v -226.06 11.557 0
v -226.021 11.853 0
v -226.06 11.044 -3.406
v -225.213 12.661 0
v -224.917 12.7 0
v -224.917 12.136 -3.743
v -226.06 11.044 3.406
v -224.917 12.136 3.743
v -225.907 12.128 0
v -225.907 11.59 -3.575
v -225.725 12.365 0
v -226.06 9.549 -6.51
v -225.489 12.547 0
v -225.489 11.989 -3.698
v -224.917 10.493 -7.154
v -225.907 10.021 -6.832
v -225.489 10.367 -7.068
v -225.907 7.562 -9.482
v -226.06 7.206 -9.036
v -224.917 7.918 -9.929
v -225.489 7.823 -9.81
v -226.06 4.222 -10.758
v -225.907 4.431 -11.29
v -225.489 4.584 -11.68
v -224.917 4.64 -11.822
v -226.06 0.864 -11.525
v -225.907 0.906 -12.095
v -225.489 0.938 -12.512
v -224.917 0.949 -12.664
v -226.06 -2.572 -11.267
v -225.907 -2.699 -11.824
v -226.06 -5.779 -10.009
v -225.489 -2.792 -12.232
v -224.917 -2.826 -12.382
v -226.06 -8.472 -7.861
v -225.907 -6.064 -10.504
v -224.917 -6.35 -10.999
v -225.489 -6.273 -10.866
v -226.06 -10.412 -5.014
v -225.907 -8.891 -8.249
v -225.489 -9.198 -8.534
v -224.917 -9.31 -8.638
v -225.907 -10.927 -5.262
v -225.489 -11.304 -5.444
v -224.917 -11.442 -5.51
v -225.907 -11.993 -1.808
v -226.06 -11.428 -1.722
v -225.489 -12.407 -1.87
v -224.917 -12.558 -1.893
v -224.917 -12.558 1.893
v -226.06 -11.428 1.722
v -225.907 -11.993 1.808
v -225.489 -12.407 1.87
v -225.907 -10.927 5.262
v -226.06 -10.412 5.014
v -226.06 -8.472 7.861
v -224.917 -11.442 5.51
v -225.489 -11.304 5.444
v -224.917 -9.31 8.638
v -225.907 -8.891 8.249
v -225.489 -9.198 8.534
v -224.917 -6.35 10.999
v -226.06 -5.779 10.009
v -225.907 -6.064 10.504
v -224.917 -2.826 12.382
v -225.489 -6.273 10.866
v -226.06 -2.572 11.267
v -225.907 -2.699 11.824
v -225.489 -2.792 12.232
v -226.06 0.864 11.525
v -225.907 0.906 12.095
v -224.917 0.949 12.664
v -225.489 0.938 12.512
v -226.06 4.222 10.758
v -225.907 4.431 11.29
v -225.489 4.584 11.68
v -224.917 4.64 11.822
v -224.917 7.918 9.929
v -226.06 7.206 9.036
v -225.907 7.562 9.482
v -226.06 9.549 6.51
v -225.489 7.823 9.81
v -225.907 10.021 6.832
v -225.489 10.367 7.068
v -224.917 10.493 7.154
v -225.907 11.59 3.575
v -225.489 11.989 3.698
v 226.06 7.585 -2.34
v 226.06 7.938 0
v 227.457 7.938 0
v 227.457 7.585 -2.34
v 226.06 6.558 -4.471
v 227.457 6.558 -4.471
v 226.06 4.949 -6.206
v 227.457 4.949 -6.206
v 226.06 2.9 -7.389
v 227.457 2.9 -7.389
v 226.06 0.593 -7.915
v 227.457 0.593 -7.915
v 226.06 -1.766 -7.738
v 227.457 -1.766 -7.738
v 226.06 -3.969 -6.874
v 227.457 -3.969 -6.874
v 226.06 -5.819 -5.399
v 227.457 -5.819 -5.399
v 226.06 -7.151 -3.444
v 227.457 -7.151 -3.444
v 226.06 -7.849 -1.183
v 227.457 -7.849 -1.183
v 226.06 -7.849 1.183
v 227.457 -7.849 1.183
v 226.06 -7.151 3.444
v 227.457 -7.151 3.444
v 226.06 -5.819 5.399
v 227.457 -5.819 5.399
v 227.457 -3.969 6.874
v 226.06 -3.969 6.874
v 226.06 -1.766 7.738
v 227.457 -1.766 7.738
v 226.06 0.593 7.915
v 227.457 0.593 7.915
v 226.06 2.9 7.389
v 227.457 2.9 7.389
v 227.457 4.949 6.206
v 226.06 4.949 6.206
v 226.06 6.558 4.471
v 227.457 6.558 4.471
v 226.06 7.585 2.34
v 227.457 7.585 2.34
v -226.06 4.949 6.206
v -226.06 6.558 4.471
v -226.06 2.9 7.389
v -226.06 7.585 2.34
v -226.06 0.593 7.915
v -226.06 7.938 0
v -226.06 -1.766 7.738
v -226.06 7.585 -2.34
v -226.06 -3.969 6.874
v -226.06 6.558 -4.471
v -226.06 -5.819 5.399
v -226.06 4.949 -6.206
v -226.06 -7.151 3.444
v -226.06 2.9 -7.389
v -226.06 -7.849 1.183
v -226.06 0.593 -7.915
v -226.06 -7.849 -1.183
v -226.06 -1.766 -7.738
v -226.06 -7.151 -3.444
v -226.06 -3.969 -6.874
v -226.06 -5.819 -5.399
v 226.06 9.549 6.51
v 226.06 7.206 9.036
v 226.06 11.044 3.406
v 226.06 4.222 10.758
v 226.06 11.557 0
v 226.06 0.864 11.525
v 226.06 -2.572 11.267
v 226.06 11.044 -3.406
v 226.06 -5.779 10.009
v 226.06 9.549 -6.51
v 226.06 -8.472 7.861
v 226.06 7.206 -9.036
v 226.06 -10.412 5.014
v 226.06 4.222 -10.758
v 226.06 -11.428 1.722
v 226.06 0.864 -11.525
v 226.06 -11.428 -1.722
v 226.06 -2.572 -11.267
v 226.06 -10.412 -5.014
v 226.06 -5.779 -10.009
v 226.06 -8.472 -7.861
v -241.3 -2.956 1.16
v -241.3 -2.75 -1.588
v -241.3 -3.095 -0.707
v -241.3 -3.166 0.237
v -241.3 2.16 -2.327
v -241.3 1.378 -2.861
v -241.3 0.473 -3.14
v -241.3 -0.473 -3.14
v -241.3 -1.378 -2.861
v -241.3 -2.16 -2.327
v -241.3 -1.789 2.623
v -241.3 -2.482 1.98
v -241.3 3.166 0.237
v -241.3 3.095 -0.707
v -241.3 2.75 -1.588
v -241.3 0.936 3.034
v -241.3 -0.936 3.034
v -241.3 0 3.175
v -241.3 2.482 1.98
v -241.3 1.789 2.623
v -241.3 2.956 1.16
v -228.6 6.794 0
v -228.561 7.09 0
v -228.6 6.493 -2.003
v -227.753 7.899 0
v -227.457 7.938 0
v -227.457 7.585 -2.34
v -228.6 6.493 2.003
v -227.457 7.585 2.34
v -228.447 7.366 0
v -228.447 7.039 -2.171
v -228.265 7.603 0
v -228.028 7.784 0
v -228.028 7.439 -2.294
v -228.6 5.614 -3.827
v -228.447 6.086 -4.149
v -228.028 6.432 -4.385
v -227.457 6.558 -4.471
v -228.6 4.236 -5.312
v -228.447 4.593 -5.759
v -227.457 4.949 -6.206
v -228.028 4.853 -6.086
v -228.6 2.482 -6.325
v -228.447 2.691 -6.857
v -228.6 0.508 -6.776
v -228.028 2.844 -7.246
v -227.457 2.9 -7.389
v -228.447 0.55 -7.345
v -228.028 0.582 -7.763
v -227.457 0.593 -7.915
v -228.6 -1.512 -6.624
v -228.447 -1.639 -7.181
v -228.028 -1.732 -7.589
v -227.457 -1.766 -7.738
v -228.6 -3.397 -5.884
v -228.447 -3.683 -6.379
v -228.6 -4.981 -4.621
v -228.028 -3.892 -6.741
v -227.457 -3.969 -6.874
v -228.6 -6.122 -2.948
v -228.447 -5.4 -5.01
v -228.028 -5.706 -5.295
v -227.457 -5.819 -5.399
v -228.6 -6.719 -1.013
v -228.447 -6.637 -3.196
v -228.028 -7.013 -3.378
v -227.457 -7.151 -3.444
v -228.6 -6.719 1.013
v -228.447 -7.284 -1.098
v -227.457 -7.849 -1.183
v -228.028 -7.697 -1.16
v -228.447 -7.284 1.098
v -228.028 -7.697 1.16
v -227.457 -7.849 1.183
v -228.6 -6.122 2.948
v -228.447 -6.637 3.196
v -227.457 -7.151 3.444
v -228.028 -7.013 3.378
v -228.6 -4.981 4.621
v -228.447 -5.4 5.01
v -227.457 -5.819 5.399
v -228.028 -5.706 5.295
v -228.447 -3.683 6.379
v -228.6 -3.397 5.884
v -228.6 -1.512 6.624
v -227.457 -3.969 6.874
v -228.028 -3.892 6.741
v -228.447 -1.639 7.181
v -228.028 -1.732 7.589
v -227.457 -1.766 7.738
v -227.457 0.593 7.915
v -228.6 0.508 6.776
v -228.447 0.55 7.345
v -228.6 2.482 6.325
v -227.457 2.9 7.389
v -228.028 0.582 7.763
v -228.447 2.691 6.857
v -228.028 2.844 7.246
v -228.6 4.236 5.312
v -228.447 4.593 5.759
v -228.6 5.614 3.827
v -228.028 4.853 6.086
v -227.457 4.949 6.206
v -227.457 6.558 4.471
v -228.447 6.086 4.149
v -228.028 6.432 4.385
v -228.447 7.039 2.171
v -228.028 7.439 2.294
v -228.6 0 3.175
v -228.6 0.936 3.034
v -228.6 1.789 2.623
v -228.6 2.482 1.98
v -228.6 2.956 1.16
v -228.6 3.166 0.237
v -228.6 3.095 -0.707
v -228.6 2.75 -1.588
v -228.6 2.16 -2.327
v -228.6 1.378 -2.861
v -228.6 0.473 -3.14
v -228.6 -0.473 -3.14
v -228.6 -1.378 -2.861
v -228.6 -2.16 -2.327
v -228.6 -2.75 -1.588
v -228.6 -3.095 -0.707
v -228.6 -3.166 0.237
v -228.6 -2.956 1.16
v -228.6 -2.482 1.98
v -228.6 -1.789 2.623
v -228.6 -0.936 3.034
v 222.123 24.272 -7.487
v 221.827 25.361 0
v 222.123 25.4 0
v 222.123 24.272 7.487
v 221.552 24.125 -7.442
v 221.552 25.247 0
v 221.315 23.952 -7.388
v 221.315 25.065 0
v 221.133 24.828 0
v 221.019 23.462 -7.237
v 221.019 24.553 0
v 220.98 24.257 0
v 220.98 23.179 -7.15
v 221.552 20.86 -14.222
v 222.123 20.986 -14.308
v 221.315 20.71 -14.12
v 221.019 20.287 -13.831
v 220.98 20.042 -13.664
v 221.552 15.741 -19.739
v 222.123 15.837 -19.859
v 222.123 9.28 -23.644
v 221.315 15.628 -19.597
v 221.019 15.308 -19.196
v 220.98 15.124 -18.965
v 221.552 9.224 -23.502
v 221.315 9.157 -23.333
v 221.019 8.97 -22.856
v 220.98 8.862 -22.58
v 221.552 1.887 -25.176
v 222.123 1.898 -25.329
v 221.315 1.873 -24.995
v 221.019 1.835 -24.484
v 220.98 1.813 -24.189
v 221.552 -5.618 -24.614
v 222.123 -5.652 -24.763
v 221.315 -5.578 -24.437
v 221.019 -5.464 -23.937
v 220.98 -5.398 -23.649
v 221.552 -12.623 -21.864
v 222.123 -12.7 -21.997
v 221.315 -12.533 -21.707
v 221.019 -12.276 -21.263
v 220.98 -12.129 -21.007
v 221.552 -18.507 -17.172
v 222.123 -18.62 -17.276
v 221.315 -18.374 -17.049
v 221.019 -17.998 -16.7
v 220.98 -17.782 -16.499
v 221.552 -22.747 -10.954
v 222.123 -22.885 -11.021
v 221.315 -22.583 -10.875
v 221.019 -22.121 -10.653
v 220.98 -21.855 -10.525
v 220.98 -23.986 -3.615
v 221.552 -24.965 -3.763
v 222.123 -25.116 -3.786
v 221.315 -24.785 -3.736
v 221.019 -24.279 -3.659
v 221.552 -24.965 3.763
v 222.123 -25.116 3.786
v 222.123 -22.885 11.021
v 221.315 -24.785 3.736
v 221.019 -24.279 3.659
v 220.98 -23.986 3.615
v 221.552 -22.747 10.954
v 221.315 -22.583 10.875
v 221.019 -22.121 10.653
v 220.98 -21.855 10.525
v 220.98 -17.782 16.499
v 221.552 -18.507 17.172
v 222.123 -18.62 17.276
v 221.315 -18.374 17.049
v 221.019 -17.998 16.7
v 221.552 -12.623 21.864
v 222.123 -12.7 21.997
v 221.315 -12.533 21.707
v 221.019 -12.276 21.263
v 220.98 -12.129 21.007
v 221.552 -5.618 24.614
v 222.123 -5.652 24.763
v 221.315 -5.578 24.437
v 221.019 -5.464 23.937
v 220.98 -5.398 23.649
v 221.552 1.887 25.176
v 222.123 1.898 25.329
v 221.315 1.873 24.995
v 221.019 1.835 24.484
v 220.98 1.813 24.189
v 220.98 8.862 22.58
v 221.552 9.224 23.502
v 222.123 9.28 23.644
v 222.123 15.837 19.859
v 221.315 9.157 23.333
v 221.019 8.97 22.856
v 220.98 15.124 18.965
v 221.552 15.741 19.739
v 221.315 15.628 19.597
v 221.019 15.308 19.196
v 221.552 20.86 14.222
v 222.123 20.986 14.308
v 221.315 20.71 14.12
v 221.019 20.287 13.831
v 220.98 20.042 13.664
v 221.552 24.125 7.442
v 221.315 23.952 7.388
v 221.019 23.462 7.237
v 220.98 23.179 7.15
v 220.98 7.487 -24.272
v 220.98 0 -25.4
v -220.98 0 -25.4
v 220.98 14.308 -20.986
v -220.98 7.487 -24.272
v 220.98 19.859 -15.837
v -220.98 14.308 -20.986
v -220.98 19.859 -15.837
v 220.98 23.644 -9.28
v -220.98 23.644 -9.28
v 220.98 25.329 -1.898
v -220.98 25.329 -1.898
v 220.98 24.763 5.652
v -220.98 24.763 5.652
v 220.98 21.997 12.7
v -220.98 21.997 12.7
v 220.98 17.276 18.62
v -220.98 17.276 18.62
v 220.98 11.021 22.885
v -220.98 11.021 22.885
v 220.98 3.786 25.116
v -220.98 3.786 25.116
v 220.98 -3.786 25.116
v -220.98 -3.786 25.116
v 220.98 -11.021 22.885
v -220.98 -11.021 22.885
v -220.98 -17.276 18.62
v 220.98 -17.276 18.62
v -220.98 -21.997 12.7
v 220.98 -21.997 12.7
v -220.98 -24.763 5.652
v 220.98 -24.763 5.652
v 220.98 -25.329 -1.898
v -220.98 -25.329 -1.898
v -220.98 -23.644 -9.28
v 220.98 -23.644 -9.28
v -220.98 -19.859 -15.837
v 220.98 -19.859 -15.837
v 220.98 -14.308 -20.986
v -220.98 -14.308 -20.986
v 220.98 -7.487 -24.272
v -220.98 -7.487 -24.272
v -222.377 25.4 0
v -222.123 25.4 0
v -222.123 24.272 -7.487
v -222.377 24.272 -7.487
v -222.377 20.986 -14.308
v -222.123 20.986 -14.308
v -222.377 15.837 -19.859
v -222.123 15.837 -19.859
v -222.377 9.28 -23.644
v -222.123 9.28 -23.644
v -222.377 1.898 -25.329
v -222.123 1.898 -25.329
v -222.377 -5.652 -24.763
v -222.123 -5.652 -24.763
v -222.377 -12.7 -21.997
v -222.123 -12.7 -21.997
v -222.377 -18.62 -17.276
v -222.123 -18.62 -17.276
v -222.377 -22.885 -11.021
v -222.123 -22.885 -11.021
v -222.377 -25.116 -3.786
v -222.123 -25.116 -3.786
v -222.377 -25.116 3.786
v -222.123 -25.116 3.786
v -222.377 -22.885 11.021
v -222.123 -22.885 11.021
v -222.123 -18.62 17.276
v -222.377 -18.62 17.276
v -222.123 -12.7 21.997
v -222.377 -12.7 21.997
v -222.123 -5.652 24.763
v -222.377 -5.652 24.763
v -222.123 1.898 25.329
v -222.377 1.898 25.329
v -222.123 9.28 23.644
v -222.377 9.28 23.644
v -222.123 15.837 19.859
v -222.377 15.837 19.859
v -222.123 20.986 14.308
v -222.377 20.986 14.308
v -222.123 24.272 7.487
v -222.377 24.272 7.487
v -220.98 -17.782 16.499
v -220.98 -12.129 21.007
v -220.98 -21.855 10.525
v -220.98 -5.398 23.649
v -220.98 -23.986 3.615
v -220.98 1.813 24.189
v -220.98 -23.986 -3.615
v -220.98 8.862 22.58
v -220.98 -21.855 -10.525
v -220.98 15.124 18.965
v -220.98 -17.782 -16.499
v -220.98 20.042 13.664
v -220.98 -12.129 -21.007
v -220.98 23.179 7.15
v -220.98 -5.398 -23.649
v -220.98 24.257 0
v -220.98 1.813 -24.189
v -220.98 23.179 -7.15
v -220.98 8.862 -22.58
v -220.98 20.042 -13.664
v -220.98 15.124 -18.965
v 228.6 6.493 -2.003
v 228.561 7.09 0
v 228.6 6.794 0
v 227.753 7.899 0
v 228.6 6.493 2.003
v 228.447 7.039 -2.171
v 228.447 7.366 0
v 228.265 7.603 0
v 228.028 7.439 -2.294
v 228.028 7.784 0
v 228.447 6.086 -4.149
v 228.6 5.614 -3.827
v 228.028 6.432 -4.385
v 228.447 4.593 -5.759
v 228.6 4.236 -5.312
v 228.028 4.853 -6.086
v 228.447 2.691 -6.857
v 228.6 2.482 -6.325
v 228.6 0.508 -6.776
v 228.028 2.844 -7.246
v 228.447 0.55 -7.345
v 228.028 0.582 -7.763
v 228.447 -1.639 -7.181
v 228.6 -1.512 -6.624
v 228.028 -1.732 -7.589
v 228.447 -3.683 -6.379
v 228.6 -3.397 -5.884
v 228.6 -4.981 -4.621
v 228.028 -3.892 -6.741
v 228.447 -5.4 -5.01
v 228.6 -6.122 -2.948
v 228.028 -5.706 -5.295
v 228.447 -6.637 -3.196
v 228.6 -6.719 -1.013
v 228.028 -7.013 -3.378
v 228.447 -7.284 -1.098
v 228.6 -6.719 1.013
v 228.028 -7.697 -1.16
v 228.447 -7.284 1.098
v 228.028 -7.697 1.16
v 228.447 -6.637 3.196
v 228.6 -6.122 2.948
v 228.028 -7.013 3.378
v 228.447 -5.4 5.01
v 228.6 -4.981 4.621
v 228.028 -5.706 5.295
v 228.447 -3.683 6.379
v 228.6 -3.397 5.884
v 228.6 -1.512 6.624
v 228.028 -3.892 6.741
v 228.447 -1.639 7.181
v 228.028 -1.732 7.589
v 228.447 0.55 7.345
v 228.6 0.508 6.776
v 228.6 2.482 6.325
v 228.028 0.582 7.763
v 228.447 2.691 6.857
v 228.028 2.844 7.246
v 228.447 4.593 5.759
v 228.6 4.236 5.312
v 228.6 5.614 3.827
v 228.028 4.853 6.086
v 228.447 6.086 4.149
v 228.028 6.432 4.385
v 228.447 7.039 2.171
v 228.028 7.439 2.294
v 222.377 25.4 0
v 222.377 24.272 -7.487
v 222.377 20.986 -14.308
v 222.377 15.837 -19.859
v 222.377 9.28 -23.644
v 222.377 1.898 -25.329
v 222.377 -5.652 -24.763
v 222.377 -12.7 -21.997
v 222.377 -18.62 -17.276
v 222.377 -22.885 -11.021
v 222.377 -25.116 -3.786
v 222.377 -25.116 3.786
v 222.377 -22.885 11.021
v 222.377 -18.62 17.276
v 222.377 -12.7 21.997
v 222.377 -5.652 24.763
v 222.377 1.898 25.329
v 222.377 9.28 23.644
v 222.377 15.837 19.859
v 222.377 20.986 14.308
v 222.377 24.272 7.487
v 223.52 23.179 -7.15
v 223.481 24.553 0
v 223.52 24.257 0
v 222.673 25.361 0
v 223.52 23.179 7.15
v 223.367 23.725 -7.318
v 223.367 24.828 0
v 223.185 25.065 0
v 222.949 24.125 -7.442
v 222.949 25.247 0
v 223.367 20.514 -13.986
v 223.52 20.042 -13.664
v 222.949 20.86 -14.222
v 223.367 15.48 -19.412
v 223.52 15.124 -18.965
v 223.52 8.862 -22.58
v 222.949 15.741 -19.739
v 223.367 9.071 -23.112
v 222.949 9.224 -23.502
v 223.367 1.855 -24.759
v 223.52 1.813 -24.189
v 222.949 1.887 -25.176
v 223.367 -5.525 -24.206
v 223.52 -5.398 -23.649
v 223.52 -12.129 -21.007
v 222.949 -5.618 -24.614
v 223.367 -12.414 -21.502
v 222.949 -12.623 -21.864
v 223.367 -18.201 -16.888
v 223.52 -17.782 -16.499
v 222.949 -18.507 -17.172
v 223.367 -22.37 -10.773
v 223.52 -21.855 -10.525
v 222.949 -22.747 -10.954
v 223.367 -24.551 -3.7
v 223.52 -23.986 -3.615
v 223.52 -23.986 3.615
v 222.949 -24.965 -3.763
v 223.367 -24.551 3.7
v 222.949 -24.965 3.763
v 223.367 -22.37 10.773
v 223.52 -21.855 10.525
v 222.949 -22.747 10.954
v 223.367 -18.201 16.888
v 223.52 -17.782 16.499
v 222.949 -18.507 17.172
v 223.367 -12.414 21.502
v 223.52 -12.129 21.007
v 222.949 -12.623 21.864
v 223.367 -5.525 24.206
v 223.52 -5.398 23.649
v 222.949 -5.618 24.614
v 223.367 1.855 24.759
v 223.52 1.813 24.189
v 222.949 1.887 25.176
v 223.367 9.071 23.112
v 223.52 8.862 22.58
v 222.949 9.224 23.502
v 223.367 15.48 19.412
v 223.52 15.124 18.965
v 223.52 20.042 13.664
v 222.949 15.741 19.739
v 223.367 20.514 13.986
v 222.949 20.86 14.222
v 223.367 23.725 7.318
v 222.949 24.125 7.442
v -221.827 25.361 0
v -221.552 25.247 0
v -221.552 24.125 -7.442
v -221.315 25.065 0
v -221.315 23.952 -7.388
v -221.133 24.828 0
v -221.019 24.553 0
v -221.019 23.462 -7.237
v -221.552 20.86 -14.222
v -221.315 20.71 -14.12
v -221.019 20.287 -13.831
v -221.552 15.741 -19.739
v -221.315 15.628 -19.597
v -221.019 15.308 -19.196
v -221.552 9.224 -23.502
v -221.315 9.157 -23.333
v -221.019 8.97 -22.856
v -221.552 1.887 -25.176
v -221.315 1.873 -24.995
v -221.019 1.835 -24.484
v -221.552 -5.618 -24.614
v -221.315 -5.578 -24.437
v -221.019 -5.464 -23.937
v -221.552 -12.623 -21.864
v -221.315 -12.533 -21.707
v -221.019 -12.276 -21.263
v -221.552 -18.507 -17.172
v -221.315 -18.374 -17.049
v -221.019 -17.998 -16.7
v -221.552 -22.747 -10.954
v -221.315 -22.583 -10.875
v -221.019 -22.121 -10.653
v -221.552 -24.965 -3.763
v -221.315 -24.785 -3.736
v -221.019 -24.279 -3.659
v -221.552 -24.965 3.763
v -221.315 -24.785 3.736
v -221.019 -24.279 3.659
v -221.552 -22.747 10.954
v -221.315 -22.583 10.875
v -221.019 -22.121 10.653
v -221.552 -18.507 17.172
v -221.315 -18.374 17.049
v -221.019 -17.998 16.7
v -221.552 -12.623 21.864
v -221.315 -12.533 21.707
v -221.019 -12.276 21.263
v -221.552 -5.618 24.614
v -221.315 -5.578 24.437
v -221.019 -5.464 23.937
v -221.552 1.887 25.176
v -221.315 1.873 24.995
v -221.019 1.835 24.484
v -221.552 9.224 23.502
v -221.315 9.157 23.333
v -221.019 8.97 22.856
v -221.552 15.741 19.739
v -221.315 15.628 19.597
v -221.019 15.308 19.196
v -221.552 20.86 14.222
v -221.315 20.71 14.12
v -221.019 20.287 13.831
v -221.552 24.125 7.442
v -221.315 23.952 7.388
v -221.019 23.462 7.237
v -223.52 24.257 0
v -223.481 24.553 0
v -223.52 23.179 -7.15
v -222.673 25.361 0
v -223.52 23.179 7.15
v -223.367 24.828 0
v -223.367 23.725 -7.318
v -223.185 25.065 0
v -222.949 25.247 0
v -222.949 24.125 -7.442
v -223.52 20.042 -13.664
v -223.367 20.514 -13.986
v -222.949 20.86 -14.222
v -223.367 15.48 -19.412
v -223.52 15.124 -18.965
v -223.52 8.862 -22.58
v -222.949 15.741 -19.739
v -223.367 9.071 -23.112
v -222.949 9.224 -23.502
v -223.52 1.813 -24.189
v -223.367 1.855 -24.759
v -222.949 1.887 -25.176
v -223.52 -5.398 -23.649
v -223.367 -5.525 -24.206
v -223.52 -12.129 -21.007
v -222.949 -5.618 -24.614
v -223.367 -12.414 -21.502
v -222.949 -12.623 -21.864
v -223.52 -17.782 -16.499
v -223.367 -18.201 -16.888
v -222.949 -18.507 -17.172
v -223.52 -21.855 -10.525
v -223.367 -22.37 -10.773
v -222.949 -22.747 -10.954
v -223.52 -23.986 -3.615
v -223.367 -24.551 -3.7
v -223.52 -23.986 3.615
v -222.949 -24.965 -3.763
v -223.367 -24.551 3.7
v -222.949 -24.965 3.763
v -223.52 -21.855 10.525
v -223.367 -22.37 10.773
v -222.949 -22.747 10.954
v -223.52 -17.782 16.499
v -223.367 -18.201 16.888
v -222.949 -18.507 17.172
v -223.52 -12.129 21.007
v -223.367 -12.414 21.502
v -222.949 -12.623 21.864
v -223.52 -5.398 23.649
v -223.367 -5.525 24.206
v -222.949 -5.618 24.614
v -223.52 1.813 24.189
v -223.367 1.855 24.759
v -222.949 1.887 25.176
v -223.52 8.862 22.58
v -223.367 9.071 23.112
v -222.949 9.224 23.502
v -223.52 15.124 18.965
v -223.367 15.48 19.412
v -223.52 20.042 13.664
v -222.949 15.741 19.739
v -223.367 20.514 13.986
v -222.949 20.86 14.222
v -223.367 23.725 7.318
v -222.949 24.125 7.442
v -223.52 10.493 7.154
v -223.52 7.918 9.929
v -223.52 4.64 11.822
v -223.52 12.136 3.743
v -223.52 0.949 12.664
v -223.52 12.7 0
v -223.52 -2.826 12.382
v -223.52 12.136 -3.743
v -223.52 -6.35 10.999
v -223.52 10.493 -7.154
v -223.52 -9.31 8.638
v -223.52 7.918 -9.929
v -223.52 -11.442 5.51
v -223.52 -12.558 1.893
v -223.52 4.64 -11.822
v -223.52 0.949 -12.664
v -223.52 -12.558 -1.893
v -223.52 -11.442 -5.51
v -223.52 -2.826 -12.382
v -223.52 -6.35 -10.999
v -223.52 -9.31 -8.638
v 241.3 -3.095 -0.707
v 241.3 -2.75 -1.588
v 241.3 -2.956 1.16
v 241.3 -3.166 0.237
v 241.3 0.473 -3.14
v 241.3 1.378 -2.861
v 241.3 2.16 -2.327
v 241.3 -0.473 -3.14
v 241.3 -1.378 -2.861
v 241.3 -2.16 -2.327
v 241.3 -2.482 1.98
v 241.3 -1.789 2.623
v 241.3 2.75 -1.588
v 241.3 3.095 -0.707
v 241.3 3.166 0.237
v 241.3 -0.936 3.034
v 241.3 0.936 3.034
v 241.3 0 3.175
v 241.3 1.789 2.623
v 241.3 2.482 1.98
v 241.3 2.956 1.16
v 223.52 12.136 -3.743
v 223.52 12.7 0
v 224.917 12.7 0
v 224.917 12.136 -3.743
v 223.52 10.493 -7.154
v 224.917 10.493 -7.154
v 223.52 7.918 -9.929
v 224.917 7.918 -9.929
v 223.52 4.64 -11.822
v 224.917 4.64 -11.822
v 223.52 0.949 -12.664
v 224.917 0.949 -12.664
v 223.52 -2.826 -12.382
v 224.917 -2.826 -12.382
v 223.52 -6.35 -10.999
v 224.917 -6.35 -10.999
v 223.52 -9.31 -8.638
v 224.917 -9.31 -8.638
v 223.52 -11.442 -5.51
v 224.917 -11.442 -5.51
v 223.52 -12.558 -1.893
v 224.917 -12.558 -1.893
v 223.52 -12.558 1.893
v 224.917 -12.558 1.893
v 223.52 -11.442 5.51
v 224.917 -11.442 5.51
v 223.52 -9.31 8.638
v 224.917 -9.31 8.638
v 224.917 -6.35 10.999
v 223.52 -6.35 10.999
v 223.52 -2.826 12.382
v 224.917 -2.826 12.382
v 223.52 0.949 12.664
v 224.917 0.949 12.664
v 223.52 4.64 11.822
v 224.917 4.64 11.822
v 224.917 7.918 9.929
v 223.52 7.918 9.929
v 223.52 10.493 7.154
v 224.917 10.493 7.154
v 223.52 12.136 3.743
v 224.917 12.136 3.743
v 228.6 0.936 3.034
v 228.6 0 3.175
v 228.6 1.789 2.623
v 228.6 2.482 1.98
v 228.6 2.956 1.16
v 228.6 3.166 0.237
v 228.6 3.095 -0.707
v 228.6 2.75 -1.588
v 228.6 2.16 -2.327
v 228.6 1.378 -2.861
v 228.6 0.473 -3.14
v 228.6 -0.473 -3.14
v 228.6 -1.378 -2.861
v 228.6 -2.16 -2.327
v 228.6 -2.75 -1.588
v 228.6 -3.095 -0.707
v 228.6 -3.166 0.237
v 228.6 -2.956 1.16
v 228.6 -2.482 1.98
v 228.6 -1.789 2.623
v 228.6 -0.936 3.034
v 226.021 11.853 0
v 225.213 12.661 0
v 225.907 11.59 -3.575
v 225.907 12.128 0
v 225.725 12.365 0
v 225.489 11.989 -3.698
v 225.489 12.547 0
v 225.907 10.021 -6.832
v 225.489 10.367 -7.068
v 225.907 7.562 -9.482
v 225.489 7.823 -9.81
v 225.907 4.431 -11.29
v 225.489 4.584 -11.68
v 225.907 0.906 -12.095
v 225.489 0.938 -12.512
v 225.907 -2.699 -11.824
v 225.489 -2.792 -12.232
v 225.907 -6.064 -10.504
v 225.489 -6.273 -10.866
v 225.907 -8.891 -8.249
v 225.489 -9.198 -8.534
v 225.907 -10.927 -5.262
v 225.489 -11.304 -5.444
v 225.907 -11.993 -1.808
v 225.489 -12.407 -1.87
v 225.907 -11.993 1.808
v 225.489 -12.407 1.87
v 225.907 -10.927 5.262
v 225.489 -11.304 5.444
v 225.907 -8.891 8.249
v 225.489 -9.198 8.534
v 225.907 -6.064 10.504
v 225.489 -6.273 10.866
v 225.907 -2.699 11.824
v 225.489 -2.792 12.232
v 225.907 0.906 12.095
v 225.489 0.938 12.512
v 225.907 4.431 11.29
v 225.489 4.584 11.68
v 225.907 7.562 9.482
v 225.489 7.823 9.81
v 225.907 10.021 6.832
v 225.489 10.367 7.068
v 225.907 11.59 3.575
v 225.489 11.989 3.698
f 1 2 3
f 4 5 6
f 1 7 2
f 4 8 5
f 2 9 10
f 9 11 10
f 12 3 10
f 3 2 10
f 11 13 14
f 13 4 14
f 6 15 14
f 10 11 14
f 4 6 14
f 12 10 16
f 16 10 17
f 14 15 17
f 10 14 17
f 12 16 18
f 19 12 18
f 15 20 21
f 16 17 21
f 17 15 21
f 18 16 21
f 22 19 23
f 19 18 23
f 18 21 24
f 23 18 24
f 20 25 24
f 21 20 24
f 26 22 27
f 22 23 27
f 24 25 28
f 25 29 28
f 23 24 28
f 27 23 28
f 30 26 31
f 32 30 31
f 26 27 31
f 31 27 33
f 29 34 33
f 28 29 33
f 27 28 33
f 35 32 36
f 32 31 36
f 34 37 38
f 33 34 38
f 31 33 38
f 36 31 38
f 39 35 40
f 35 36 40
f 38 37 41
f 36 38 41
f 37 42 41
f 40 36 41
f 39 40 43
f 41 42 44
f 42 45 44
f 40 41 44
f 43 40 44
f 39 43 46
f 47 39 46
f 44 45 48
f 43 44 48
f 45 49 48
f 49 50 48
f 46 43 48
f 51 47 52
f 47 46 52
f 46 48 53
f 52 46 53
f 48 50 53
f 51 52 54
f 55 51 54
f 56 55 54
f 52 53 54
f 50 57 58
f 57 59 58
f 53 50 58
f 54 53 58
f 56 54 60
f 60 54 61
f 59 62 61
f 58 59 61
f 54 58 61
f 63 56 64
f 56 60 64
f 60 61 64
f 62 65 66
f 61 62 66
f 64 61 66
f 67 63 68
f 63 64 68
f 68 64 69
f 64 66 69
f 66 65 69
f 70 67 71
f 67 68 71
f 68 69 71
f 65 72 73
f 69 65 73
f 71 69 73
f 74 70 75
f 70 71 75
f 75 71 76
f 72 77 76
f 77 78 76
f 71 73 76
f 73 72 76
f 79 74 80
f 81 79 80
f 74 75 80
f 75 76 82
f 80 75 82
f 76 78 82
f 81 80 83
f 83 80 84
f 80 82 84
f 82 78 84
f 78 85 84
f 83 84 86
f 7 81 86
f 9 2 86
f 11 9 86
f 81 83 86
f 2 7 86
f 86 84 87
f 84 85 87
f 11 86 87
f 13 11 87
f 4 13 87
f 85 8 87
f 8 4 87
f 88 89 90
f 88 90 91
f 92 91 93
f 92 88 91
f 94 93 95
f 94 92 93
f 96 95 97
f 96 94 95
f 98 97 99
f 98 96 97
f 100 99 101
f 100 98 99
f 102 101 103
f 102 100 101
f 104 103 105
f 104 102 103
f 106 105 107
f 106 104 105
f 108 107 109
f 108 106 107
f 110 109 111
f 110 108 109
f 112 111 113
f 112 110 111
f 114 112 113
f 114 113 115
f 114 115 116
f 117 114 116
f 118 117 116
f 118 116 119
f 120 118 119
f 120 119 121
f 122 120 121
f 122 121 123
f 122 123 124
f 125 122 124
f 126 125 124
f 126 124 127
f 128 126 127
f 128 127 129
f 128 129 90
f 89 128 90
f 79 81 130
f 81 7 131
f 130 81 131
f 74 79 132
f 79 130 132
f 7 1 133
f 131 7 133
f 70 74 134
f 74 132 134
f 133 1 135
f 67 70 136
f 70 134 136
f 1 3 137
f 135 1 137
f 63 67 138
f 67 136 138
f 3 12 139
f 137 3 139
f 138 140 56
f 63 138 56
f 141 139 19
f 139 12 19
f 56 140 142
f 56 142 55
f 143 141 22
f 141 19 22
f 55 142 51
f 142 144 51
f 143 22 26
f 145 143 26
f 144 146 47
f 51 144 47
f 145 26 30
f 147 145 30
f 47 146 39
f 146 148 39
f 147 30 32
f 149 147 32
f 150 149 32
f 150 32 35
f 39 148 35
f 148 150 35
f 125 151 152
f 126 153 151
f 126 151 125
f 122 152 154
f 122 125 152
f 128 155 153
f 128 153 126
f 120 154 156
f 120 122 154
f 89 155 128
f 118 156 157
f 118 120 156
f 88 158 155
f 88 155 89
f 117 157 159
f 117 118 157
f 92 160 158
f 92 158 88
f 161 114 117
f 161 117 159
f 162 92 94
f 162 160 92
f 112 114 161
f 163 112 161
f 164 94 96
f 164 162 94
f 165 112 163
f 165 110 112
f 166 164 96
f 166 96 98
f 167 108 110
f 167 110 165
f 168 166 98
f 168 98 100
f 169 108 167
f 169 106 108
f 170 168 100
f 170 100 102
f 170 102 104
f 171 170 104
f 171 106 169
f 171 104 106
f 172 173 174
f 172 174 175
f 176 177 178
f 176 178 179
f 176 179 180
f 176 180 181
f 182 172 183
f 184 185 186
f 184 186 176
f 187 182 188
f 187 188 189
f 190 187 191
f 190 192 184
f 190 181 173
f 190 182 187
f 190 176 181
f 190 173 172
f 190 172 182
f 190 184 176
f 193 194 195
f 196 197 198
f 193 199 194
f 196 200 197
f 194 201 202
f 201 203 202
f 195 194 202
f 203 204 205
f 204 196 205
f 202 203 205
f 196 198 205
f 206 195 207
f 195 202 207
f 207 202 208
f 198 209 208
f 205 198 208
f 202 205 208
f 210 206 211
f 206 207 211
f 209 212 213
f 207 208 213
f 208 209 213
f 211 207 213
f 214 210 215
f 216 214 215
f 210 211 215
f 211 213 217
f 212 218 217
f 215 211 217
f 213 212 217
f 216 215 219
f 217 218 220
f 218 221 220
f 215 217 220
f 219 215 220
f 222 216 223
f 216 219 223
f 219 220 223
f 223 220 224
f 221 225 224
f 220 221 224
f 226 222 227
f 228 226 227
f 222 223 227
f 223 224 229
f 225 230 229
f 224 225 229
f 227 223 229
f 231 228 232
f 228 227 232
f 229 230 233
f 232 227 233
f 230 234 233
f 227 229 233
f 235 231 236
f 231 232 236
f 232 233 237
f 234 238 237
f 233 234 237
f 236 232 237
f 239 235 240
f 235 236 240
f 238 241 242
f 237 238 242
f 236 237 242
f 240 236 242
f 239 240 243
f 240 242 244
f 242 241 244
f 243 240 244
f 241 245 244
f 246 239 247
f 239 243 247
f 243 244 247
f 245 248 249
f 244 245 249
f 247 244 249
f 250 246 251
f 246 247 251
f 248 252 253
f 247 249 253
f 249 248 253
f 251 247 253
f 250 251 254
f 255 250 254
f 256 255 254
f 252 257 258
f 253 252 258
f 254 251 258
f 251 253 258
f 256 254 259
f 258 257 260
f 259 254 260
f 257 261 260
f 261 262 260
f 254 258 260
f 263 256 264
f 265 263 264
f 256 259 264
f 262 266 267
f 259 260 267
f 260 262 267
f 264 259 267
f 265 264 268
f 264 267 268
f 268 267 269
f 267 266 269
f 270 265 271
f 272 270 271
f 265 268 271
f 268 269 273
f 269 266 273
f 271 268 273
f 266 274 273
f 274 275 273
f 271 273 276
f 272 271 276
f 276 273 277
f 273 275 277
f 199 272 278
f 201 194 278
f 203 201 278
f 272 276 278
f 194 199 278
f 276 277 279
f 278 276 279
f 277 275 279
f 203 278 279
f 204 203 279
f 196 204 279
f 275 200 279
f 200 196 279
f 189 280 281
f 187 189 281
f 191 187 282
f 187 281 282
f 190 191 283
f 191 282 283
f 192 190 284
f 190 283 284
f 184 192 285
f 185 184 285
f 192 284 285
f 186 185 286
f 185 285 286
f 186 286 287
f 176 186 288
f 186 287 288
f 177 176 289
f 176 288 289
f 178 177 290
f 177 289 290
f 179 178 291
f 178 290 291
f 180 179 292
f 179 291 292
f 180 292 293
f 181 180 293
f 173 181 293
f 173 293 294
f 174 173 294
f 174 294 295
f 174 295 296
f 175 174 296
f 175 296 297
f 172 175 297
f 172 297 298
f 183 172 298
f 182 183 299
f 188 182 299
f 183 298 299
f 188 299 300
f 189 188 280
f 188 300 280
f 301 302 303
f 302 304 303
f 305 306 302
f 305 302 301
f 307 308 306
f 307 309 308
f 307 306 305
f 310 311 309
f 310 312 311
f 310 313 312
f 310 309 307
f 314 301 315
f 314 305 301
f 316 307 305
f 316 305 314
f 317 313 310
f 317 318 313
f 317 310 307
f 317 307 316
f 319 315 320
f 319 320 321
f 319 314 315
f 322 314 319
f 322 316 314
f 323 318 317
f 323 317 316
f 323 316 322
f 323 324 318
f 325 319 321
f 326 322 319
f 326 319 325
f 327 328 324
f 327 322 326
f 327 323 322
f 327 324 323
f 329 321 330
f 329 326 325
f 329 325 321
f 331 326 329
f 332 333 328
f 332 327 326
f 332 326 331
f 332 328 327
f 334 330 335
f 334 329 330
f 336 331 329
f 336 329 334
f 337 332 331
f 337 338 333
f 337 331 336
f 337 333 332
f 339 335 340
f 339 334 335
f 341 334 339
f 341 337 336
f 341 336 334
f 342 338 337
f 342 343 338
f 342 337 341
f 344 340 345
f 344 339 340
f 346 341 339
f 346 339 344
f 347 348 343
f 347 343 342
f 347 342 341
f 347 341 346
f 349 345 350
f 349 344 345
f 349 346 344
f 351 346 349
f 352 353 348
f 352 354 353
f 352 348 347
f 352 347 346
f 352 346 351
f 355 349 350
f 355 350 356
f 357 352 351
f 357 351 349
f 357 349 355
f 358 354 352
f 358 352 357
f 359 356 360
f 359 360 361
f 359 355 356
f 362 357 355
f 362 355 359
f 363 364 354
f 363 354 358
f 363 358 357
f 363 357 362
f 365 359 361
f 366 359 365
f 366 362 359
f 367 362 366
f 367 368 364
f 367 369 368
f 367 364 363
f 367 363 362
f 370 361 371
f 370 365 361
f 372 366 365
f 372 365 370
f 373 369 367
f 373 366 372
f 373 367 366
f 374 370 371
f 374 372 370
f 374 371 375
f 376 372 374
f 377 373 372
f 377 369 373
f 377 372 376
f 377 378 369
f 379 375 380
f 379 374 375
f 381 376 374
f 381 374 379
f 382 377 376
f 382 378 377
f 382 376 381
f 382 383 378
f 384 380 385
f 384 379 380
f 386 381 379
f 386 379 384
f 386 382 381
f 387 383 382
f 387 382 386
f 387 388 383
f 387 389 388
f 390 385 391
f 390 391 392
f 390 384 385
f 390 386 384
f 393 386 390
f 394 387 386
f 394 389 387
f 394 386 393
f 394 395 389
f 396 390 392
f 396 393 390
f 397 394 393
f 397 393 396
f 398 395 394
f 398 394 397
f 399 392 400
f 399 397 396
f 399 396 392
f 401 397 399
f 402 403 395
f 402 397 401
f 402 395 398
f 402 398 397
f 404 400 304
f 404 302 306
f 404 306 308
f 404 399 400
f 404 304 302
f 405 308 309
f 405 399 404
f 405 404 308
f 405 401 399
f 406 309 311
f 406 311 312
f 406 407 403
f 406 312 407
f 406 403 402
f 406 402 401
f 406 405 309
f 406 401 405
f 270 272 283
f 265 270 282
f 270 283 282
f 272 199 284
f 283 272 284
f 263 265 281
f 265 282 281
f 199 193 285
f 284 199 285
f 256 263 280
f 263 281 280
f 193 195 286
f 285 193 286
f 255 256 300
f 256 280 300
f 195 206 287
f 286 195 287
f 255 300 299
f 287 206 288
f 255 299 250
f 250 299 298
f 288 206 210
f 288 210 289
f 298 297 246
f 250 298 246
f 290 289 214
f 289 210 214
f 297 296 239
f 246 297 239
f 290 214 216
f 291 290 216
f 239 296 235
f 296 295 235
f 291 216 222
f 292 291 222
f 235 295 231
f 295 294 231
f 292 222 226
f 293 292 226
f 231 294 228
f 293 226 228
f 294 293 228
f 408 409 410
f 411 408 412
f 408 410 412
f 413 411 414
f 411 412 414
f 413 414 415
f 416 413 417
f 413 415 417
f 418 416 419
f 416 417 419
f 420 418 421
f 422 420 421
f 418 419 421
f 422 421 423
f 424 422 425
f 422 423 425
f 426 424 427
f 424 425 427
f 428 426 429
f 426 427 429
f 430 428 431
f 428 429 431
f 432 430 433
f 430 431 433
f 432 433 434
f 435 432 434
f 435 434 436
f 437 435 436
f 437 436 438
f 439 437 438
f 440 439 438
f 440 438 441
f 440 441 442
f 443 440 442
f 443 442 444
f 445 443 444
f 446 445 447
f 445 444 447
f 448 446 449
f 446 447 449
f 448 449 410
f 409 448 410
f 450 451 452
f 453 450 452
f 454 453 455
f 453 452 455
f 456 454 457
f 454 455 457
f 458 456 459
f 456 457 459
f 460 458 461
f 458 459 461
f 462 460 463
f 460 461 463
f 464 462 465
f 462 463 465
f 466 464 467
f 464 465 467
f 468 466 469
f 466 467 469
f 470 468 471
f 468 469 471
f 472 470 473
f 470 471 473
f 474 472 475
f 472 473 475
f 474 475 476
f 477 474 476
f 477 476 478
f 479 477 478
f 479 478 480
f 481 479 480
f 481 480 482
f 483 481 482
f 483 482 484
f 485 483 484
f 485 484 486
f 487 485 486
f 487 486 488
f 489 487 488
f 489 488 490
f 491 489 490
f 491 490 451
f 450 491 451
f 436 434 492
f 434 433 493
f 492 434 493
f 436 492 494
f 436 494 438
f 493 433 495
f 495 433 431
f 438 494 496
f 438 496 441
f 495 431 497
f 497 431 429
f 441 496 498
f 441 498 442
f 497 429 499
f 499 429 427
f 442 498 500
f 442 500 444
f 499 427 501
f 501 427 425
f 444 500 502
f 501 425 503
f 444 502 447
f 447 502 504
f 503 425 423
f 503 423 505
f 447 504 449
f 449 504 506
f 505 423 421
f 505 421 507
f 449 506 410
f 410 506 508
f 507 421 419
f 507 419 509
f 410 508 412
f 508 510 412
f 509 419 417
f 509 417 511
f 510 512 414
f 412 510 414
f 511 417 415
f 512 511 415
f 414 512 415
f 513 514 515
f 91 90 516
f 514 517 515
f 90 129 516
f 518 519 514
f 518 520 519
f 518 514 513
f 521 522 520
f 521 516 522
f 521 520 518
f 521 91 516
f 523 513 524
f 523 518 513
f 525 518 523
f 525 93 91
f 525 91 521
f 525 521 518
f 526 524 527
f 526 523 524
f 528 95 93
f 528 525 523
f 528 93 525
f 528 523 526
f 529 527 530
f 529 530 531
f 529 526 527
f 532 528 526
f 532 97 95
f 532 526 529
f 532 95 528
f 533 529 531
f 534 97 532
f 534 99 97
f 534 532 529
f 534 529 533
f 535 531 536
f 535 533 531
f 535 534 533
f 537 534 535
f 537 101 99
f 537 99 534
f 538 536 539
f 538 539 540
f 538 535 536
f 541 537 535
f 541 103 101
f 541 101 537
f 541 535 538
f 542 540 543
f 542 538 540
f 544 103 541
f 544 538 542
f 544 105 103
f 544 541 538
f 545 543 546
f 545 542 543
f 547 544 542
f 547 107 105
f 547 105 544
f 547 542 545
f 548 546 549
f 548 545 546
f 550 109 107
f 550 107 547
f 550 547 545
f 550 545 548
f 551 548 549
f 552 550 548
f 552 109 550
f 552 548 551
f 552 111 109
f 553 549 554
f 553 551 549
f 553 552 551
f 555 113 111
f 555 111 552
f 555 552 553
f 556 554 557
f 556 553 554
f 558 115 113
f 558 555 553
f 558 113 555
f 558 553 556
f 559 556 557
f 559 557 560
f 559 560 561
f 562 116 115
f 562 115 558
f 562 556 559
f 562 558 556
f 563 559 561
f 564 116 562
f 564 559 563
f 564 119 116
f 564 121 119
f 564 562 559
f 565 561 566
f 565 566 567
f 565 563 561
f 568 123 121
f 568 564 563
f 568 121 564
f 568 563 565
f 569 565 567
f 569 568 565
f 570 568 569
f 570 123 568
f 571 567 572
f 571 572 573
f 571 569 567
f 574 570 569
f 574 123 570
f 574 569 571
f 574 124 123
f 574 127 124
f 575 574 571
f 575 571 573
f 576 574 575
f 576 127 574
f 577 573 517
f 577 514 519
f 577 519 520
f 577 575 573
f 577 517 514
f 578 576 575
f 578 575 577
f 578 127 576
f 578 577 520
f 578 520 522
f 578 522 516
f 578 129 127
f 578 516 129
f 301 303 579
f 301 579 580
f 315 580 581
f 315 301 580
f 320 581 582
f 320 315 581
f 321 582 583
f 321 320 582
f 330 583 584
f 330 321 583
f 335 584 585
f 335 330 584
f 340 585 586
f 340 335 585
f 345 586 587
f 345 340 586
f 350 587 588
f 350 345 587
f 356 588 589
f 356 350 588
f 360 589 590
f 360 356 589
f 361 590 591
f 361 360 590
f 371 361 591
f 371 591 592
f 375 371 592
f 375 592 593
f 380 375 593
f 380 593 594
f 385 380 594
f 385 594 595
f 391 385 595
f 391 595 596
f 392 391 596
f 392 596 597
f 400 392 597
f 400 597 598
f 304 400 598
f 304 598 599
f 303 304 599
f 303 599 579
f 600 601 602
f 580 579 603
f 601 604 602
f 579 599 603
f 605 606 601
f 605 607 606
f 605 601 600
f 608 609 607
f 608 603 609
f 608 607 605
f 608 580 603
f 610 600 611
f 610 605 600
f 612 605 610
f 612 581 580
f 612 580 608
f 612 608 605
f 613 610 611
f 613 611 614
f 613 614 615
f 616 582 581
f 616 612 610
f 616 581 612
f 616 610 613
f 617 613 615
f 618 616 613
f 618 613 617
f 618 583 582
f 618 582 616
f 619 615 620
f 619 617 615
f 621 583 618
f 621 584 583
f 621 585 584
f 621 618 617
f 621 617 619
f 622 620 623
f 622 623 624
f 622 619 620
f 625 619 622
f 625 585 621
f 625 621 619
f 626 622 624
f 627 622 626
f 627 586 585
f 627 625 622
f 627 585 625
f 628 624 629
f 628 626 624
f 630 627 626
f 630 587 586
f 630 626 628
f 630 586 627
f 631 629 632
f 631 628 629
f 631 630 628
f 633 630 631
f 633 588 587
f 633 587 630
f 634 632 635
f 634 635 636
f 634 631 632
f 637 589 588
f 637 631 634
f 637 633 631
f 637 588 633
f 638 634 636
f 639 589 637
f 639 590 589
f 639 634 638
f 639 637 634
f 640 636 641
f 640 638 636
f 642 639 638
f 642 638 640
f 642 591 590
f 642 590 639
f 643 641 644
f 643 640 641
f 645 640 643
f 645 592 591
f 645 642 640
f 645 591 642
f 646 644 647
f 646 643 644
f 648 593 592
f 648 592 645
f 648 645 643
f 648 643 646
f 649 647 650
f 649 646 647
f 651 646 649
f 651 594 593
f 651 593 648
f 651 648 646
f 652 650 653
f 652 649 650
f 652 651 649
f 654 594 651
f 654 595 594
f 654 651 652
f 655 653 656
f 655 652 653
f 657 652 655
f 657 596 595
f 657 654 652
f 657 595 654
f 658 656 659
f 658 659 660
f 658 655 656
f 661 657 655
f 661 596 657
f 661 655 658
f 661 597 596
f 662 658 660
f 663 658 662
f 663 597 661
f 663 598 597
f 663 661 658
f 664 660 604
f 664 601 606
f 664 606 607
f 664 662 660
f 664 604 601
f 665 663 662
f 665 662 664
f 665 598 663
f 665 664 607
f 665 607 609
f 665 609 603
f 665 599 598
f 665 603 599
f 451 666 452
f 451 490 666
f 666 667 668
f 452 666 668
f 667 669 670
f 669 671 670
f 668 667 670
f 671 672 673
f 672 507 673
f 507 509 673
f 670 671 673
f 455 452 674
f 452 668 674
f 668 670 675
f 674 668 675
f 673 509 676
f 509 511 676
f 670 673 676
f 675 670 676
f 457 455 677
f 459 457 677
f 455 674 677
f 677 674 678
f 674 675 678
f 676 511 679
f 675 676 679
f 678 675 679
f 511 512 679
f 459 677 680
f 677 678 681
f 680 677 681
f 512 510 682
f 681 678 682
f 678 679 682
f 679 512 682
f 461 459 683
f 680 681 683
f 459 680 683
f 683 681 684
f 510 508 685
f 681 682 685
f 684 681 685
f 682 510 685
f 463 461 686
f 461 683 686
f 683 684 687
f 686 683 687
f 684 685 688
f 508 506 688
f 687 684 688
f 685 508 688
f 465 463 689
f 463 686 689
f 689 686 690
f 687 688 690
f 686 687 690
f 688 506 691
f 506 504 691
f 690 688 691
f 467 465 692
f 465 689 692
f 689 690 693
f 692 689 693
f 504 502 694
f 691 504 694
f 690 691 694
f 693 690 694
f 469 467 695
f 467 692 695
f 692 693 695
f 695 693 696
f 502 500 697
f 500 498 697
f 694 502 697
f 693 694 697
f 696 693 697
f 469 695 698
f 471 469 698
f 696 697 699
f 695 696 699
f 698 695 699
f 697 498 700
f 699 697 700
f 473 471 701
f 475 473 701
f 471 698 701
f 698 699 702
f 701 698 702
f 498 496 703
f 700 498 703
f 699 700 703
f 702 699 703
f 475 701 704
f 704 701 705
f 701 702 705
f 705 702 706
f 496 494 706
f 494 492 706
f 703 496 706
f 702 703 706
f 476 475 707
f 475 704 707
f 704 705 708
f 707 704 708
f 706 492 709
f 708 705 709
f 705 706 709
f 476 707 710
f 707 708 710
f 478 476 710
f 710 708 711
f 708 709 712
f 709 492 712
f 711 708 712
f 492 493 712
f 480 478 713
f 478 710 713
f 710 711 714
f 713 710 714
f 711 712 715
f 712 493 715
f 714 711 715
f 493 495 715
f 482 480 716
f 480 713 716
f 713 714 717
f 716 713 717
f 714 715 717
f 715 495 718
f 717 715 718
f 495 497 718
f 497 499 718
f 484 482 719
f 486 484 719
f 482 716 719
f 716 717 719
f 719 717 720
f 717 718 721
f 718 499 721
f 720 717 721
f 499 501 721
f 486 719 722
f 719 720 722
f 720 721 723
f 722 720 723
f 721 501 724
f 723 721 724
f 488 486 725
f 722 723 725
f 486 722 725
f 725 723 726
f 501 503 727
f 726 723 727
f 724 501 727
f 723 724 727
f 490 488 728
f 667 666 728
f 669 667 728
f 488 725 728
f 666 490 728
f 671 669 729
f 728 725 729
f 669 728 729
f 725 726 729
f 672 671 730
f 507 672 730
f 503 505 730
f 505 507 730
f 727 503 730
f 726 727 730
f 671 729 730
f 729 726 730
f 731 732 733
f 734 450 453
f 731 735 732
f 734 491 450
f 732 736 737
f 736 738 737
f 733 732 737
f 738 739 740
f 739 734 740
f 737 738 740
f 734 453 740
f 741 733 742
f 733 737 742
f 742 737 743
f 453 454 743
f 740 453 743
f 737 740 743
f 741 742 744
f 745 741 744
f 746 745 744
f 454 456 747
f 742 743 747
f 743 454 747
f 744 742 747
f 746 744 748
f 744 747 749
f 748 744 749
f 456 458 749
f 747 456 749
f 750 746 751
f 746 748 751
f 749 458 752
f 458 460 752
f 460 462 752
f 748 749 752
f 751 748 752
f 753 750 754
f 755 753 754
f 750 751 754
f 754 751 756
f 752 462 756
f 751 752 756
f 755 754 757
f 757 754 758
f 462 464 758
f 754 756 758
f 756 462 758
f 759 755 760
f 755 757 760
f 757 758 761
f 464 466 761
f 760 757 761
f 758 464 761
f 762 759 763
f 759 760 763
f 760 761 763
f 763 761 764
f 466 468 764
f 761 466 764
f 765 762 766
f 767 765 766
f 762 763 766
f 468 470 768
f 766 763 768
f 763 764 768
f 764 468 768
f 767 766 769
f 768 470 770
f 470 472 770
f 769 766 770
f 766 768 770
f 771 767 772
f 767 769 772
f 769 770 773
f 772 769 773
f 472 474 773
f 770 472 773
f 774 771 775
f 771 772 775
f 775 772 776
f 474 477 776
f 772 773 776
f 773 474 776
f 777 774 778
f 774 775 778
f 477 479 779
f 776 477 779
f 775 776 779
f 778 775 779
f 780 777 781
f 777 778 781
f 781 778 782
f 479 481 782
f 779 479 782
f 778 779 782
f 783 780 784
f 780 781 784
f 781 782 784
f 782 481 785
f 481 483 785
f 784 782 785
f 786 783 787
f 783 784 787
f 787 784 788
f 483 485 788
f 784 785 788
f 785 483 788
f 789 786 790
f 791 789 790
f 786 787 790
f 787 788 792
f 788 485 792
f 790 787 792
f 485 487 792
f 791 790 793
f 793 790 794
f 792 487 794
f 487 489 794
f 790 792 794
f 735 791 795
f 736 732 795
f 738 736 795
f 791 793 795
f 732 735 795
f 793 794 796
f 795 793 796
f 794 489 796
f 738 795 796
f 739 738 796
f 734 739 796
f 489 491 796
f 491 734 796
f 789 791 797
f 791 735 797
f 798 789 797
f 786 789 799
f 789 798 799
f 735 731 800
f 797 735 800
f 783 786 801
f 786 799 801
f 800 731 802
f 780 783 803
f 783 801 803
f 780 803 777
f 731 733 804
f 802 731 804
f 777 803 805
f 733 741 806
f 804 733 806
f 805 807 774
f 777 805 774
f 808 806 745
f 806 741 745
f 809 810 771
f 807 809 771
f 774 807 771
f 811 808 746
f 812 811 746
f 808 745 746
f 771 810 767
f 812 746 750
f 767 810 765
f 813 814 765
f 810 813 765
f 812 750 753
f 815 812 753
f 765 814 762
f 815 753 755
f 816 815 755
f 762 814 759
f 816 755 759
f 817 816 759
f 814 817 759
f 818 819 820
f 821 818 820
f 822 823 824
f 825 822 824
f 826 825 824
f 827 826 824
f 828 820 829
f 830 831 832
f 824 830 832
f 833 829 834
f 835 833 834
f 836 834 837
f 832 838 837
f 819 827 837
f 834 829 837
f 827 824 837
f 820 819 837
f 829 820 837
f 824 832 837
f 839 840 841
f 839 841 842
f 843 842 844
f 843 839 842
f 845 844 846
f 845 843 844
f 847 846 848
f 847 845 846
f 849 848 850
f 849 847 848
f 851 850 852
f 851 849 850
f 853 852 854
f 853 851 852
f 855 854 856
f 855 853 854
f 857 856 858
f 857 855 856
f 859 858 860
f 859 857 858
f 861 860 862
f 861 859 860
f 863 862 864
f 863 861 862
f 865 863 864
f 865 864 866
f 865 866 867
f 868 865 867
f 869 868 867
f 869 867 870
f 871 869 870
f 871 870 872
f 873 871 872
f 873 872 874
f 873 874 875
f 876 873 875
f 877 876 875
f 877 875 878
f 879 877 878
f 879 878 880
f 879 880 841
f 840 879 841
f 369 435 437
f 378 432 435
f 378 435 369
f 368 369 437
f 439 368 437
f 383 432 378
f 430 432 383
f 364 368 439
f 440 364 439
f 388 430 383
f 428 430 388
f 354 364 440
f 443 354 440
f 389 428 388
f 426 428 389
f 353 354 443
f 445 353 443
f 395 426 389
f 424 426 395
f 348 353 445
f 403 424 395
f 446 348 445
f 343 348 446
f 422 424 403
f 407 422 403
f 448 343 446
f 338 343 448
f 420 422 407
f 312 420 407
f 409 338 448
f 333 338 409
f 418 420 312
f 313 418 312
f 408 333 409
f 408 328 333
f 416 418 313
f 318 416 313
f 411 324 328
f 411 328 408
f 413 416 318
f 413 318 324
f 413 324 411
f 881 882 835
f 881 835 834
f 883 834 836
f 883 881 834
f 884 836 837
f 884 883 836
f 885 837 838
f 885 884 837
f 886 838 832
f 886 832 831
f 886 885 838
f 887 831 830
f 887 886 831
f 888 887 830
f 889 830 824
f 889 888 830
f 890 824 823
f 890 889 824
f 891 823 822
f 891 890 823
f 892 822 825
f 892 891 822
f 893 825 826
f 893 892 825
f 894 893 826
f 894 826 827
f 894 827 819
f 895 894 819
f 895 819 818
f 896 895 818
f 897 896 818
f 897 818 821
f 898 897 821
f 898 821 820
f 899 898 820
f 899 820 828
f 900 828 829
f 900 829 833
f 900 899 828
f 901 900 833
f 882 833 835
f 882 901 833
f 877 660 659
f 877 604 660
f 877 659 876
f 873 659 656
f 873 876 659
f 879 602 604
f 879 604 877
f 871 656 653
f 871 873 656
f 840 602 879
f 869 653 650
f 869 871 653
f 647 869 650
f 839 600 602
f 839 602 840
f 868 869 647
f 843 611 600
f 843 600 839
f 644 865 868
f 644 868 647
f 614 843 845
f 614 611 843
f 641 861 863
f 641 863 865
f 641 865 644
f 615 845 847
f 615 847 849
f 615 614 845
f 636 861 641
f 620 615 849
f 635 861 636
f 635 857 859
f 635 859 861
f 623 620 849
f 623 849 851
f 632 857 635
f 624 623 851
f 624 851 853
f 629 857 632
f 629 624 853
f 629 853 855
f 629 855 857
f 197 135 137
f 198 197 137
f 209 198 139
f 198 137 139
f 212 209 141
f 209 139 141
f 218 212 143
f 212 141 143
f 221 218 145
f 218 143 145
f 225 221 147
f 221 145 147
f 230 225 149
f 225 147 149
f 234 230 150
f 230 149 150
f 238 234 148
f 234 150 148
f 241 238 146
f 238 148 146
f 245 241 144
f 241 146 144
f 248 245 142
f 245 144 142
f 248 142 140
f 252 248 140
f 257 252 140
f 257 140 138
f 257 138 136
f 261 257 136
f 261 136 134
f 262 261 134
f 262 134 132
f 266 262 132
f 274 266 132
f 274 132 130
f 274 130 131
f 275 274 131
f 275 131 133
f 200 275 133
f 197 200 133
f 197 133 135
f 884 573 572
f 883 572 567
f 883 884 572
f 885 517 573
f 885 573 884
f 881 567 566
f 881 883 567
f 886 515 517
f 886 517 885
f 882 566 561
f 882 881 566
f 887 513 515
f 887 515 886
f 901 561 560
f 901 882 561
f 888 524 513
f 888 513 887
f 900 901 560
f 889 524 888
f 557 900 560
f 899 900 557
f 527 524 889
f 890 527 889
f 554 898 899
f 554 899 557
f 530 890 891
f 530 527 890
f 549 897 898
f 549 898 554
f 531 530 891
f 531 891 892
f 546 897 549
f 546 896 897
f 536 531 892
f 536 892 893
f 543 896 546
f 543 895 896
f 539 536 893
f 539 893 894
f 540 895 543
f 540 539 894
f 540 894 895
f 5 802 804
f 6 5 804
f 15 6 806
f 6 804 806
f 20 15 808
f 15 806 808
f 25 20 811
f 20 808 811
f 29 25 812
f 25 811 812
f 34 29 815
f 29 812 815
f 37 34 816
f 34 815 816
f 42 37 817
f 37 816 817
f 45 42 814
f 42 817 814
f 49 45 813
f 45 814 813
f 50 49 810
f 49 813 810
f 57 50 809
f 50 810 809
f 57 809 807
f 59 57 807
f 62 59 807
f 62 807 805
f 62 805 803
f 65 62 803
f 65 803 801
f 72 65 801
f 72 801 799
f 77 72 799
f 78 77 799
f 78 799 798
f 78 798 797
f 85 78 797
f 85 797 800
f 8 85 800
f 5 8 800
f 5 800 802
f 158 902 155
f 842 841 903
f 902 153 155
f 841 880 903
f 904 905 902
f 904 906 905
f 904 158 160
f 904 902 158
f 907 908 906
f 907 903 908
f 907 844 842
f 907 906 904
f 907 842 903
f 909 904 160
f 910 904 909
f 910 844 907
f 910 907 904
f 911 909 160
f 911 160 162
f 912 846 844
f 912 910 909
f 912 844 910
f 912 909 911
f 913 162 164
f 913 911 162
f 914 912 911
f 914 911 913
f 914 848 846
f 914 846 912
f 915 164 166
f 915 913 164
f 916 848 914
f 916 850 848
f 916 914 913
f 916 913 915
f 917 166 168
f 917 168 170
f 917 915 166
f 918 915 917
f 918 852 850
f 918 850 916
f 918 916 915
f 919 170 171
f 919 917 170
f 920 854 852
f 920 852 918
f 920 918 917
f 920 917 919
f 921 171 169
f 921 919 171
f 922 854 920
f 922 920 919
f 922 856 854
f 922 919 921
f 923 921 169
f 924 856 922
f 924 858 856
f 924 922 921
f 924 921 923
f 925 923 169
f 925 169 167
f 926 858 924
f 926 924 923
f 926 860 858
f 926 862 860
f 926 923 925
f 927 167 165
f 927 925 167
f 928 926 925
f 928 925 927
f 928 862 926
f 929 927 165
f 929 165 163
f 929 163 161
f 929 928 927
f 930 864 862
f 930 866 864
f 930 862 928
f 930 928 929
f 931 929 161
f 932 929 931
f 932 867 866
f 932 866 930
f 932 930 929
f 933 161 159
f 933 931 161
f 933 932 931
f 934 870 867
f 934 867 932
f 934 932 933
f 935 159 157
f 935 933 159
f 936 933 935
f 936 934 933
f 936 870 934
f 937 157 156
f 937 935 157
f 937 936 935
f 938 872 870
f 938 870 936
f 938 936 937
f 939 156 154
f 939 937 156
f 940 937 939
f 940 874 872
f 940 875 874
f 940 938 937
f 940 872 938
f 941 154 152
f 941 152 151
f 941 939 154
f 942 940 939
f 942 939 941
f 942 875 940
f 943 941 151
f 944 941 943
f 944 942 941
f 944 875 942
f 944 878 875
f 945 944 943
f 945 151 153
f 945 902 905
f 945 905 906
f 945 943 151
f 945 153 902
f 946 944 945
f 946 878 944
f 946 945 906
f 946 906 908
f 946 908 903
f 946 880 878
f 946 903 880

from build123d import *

# Parameters (mm, degrees)
REVOLVE1_ANGLE      = 360
FILLET1_R           = 1.143
SKETCH2_R           = 3.175
BOSS_EXTRUDE1_DEPTH = 12.7
BOSS_EXTRUDE2_START = -220.98
SKETCH3_R           = 25.4
BOSS_EXTRUDE2_DEPTH = 441.96


with BuildPart() as part:
    # Sketch1 → Revolve1 (revolve, symmetric)
    with BuildSketch(Plane.XY) as revolve1_sk:
        Polygon((-228.6, 0), (-228.6, 7.9375), (-226.06, 7.9375), (-226.06, 12.7), (-223.52, 12.7), (-223.52, 25.4), (-220.98, 25.4), (-220.98, 0), align=None)
    revolve(axis=Axis((-228.6, 0, 0), (1, 0, 0)), revolution_arc=REVOLVE1_ANGLE / 2)
    revolve(revolve1_sk.sketch, axis=Axis((-228.6, 0, 0), (-1, 0, 0)), revolution_arc=REVOLVE1_ANGLE / 2)

    # Fillet1
    fillet1_edges = [part.edges().sort_by_distance(p)[0] for p in [
        (-220.98, 0, 25.4),
        (-223.52, 0, 25.4),
        (-226.06, 0, 12.7),
        (-228.6, 0, 7.9375),
    ]]
    fillet(fillet1_edges, radius=FILLET1_R)

    # Sketch2 → Boss-Extrude1 (add)
    with BuildSketch(Plane.ZY.offset(228.6)):
        Circle(SKETCH2_R)
    extrude(amount=BOSS_EXTRUDE1_DEPTH)


with BuildPart() as body_2:
    # Mirror2: mirrored copy
    add(part.part.mirror(Plane(origin=(0, 0, 0), x_dir=(0, 0, 1), z_dir=(1, 0, 0))))


with BuildPart() as part_1:
    add(part.part)

    add(body_2.part)  # Boss-Extrude2 merges body 2
    # Sketch3 → Boss-Extrude2 (add)
    with BuildSketch(Plane(origin=(0, 0, 0), x_dir=(0, 0, -1), z_dir=(1, 0, 0)).offset(BOSS_EXTRUDE2_START)):
        Circle(SKETCH3_R)
    extrude(amount=BOSS_EXTRUDE2_DEPTH)


solid = part_1.part
